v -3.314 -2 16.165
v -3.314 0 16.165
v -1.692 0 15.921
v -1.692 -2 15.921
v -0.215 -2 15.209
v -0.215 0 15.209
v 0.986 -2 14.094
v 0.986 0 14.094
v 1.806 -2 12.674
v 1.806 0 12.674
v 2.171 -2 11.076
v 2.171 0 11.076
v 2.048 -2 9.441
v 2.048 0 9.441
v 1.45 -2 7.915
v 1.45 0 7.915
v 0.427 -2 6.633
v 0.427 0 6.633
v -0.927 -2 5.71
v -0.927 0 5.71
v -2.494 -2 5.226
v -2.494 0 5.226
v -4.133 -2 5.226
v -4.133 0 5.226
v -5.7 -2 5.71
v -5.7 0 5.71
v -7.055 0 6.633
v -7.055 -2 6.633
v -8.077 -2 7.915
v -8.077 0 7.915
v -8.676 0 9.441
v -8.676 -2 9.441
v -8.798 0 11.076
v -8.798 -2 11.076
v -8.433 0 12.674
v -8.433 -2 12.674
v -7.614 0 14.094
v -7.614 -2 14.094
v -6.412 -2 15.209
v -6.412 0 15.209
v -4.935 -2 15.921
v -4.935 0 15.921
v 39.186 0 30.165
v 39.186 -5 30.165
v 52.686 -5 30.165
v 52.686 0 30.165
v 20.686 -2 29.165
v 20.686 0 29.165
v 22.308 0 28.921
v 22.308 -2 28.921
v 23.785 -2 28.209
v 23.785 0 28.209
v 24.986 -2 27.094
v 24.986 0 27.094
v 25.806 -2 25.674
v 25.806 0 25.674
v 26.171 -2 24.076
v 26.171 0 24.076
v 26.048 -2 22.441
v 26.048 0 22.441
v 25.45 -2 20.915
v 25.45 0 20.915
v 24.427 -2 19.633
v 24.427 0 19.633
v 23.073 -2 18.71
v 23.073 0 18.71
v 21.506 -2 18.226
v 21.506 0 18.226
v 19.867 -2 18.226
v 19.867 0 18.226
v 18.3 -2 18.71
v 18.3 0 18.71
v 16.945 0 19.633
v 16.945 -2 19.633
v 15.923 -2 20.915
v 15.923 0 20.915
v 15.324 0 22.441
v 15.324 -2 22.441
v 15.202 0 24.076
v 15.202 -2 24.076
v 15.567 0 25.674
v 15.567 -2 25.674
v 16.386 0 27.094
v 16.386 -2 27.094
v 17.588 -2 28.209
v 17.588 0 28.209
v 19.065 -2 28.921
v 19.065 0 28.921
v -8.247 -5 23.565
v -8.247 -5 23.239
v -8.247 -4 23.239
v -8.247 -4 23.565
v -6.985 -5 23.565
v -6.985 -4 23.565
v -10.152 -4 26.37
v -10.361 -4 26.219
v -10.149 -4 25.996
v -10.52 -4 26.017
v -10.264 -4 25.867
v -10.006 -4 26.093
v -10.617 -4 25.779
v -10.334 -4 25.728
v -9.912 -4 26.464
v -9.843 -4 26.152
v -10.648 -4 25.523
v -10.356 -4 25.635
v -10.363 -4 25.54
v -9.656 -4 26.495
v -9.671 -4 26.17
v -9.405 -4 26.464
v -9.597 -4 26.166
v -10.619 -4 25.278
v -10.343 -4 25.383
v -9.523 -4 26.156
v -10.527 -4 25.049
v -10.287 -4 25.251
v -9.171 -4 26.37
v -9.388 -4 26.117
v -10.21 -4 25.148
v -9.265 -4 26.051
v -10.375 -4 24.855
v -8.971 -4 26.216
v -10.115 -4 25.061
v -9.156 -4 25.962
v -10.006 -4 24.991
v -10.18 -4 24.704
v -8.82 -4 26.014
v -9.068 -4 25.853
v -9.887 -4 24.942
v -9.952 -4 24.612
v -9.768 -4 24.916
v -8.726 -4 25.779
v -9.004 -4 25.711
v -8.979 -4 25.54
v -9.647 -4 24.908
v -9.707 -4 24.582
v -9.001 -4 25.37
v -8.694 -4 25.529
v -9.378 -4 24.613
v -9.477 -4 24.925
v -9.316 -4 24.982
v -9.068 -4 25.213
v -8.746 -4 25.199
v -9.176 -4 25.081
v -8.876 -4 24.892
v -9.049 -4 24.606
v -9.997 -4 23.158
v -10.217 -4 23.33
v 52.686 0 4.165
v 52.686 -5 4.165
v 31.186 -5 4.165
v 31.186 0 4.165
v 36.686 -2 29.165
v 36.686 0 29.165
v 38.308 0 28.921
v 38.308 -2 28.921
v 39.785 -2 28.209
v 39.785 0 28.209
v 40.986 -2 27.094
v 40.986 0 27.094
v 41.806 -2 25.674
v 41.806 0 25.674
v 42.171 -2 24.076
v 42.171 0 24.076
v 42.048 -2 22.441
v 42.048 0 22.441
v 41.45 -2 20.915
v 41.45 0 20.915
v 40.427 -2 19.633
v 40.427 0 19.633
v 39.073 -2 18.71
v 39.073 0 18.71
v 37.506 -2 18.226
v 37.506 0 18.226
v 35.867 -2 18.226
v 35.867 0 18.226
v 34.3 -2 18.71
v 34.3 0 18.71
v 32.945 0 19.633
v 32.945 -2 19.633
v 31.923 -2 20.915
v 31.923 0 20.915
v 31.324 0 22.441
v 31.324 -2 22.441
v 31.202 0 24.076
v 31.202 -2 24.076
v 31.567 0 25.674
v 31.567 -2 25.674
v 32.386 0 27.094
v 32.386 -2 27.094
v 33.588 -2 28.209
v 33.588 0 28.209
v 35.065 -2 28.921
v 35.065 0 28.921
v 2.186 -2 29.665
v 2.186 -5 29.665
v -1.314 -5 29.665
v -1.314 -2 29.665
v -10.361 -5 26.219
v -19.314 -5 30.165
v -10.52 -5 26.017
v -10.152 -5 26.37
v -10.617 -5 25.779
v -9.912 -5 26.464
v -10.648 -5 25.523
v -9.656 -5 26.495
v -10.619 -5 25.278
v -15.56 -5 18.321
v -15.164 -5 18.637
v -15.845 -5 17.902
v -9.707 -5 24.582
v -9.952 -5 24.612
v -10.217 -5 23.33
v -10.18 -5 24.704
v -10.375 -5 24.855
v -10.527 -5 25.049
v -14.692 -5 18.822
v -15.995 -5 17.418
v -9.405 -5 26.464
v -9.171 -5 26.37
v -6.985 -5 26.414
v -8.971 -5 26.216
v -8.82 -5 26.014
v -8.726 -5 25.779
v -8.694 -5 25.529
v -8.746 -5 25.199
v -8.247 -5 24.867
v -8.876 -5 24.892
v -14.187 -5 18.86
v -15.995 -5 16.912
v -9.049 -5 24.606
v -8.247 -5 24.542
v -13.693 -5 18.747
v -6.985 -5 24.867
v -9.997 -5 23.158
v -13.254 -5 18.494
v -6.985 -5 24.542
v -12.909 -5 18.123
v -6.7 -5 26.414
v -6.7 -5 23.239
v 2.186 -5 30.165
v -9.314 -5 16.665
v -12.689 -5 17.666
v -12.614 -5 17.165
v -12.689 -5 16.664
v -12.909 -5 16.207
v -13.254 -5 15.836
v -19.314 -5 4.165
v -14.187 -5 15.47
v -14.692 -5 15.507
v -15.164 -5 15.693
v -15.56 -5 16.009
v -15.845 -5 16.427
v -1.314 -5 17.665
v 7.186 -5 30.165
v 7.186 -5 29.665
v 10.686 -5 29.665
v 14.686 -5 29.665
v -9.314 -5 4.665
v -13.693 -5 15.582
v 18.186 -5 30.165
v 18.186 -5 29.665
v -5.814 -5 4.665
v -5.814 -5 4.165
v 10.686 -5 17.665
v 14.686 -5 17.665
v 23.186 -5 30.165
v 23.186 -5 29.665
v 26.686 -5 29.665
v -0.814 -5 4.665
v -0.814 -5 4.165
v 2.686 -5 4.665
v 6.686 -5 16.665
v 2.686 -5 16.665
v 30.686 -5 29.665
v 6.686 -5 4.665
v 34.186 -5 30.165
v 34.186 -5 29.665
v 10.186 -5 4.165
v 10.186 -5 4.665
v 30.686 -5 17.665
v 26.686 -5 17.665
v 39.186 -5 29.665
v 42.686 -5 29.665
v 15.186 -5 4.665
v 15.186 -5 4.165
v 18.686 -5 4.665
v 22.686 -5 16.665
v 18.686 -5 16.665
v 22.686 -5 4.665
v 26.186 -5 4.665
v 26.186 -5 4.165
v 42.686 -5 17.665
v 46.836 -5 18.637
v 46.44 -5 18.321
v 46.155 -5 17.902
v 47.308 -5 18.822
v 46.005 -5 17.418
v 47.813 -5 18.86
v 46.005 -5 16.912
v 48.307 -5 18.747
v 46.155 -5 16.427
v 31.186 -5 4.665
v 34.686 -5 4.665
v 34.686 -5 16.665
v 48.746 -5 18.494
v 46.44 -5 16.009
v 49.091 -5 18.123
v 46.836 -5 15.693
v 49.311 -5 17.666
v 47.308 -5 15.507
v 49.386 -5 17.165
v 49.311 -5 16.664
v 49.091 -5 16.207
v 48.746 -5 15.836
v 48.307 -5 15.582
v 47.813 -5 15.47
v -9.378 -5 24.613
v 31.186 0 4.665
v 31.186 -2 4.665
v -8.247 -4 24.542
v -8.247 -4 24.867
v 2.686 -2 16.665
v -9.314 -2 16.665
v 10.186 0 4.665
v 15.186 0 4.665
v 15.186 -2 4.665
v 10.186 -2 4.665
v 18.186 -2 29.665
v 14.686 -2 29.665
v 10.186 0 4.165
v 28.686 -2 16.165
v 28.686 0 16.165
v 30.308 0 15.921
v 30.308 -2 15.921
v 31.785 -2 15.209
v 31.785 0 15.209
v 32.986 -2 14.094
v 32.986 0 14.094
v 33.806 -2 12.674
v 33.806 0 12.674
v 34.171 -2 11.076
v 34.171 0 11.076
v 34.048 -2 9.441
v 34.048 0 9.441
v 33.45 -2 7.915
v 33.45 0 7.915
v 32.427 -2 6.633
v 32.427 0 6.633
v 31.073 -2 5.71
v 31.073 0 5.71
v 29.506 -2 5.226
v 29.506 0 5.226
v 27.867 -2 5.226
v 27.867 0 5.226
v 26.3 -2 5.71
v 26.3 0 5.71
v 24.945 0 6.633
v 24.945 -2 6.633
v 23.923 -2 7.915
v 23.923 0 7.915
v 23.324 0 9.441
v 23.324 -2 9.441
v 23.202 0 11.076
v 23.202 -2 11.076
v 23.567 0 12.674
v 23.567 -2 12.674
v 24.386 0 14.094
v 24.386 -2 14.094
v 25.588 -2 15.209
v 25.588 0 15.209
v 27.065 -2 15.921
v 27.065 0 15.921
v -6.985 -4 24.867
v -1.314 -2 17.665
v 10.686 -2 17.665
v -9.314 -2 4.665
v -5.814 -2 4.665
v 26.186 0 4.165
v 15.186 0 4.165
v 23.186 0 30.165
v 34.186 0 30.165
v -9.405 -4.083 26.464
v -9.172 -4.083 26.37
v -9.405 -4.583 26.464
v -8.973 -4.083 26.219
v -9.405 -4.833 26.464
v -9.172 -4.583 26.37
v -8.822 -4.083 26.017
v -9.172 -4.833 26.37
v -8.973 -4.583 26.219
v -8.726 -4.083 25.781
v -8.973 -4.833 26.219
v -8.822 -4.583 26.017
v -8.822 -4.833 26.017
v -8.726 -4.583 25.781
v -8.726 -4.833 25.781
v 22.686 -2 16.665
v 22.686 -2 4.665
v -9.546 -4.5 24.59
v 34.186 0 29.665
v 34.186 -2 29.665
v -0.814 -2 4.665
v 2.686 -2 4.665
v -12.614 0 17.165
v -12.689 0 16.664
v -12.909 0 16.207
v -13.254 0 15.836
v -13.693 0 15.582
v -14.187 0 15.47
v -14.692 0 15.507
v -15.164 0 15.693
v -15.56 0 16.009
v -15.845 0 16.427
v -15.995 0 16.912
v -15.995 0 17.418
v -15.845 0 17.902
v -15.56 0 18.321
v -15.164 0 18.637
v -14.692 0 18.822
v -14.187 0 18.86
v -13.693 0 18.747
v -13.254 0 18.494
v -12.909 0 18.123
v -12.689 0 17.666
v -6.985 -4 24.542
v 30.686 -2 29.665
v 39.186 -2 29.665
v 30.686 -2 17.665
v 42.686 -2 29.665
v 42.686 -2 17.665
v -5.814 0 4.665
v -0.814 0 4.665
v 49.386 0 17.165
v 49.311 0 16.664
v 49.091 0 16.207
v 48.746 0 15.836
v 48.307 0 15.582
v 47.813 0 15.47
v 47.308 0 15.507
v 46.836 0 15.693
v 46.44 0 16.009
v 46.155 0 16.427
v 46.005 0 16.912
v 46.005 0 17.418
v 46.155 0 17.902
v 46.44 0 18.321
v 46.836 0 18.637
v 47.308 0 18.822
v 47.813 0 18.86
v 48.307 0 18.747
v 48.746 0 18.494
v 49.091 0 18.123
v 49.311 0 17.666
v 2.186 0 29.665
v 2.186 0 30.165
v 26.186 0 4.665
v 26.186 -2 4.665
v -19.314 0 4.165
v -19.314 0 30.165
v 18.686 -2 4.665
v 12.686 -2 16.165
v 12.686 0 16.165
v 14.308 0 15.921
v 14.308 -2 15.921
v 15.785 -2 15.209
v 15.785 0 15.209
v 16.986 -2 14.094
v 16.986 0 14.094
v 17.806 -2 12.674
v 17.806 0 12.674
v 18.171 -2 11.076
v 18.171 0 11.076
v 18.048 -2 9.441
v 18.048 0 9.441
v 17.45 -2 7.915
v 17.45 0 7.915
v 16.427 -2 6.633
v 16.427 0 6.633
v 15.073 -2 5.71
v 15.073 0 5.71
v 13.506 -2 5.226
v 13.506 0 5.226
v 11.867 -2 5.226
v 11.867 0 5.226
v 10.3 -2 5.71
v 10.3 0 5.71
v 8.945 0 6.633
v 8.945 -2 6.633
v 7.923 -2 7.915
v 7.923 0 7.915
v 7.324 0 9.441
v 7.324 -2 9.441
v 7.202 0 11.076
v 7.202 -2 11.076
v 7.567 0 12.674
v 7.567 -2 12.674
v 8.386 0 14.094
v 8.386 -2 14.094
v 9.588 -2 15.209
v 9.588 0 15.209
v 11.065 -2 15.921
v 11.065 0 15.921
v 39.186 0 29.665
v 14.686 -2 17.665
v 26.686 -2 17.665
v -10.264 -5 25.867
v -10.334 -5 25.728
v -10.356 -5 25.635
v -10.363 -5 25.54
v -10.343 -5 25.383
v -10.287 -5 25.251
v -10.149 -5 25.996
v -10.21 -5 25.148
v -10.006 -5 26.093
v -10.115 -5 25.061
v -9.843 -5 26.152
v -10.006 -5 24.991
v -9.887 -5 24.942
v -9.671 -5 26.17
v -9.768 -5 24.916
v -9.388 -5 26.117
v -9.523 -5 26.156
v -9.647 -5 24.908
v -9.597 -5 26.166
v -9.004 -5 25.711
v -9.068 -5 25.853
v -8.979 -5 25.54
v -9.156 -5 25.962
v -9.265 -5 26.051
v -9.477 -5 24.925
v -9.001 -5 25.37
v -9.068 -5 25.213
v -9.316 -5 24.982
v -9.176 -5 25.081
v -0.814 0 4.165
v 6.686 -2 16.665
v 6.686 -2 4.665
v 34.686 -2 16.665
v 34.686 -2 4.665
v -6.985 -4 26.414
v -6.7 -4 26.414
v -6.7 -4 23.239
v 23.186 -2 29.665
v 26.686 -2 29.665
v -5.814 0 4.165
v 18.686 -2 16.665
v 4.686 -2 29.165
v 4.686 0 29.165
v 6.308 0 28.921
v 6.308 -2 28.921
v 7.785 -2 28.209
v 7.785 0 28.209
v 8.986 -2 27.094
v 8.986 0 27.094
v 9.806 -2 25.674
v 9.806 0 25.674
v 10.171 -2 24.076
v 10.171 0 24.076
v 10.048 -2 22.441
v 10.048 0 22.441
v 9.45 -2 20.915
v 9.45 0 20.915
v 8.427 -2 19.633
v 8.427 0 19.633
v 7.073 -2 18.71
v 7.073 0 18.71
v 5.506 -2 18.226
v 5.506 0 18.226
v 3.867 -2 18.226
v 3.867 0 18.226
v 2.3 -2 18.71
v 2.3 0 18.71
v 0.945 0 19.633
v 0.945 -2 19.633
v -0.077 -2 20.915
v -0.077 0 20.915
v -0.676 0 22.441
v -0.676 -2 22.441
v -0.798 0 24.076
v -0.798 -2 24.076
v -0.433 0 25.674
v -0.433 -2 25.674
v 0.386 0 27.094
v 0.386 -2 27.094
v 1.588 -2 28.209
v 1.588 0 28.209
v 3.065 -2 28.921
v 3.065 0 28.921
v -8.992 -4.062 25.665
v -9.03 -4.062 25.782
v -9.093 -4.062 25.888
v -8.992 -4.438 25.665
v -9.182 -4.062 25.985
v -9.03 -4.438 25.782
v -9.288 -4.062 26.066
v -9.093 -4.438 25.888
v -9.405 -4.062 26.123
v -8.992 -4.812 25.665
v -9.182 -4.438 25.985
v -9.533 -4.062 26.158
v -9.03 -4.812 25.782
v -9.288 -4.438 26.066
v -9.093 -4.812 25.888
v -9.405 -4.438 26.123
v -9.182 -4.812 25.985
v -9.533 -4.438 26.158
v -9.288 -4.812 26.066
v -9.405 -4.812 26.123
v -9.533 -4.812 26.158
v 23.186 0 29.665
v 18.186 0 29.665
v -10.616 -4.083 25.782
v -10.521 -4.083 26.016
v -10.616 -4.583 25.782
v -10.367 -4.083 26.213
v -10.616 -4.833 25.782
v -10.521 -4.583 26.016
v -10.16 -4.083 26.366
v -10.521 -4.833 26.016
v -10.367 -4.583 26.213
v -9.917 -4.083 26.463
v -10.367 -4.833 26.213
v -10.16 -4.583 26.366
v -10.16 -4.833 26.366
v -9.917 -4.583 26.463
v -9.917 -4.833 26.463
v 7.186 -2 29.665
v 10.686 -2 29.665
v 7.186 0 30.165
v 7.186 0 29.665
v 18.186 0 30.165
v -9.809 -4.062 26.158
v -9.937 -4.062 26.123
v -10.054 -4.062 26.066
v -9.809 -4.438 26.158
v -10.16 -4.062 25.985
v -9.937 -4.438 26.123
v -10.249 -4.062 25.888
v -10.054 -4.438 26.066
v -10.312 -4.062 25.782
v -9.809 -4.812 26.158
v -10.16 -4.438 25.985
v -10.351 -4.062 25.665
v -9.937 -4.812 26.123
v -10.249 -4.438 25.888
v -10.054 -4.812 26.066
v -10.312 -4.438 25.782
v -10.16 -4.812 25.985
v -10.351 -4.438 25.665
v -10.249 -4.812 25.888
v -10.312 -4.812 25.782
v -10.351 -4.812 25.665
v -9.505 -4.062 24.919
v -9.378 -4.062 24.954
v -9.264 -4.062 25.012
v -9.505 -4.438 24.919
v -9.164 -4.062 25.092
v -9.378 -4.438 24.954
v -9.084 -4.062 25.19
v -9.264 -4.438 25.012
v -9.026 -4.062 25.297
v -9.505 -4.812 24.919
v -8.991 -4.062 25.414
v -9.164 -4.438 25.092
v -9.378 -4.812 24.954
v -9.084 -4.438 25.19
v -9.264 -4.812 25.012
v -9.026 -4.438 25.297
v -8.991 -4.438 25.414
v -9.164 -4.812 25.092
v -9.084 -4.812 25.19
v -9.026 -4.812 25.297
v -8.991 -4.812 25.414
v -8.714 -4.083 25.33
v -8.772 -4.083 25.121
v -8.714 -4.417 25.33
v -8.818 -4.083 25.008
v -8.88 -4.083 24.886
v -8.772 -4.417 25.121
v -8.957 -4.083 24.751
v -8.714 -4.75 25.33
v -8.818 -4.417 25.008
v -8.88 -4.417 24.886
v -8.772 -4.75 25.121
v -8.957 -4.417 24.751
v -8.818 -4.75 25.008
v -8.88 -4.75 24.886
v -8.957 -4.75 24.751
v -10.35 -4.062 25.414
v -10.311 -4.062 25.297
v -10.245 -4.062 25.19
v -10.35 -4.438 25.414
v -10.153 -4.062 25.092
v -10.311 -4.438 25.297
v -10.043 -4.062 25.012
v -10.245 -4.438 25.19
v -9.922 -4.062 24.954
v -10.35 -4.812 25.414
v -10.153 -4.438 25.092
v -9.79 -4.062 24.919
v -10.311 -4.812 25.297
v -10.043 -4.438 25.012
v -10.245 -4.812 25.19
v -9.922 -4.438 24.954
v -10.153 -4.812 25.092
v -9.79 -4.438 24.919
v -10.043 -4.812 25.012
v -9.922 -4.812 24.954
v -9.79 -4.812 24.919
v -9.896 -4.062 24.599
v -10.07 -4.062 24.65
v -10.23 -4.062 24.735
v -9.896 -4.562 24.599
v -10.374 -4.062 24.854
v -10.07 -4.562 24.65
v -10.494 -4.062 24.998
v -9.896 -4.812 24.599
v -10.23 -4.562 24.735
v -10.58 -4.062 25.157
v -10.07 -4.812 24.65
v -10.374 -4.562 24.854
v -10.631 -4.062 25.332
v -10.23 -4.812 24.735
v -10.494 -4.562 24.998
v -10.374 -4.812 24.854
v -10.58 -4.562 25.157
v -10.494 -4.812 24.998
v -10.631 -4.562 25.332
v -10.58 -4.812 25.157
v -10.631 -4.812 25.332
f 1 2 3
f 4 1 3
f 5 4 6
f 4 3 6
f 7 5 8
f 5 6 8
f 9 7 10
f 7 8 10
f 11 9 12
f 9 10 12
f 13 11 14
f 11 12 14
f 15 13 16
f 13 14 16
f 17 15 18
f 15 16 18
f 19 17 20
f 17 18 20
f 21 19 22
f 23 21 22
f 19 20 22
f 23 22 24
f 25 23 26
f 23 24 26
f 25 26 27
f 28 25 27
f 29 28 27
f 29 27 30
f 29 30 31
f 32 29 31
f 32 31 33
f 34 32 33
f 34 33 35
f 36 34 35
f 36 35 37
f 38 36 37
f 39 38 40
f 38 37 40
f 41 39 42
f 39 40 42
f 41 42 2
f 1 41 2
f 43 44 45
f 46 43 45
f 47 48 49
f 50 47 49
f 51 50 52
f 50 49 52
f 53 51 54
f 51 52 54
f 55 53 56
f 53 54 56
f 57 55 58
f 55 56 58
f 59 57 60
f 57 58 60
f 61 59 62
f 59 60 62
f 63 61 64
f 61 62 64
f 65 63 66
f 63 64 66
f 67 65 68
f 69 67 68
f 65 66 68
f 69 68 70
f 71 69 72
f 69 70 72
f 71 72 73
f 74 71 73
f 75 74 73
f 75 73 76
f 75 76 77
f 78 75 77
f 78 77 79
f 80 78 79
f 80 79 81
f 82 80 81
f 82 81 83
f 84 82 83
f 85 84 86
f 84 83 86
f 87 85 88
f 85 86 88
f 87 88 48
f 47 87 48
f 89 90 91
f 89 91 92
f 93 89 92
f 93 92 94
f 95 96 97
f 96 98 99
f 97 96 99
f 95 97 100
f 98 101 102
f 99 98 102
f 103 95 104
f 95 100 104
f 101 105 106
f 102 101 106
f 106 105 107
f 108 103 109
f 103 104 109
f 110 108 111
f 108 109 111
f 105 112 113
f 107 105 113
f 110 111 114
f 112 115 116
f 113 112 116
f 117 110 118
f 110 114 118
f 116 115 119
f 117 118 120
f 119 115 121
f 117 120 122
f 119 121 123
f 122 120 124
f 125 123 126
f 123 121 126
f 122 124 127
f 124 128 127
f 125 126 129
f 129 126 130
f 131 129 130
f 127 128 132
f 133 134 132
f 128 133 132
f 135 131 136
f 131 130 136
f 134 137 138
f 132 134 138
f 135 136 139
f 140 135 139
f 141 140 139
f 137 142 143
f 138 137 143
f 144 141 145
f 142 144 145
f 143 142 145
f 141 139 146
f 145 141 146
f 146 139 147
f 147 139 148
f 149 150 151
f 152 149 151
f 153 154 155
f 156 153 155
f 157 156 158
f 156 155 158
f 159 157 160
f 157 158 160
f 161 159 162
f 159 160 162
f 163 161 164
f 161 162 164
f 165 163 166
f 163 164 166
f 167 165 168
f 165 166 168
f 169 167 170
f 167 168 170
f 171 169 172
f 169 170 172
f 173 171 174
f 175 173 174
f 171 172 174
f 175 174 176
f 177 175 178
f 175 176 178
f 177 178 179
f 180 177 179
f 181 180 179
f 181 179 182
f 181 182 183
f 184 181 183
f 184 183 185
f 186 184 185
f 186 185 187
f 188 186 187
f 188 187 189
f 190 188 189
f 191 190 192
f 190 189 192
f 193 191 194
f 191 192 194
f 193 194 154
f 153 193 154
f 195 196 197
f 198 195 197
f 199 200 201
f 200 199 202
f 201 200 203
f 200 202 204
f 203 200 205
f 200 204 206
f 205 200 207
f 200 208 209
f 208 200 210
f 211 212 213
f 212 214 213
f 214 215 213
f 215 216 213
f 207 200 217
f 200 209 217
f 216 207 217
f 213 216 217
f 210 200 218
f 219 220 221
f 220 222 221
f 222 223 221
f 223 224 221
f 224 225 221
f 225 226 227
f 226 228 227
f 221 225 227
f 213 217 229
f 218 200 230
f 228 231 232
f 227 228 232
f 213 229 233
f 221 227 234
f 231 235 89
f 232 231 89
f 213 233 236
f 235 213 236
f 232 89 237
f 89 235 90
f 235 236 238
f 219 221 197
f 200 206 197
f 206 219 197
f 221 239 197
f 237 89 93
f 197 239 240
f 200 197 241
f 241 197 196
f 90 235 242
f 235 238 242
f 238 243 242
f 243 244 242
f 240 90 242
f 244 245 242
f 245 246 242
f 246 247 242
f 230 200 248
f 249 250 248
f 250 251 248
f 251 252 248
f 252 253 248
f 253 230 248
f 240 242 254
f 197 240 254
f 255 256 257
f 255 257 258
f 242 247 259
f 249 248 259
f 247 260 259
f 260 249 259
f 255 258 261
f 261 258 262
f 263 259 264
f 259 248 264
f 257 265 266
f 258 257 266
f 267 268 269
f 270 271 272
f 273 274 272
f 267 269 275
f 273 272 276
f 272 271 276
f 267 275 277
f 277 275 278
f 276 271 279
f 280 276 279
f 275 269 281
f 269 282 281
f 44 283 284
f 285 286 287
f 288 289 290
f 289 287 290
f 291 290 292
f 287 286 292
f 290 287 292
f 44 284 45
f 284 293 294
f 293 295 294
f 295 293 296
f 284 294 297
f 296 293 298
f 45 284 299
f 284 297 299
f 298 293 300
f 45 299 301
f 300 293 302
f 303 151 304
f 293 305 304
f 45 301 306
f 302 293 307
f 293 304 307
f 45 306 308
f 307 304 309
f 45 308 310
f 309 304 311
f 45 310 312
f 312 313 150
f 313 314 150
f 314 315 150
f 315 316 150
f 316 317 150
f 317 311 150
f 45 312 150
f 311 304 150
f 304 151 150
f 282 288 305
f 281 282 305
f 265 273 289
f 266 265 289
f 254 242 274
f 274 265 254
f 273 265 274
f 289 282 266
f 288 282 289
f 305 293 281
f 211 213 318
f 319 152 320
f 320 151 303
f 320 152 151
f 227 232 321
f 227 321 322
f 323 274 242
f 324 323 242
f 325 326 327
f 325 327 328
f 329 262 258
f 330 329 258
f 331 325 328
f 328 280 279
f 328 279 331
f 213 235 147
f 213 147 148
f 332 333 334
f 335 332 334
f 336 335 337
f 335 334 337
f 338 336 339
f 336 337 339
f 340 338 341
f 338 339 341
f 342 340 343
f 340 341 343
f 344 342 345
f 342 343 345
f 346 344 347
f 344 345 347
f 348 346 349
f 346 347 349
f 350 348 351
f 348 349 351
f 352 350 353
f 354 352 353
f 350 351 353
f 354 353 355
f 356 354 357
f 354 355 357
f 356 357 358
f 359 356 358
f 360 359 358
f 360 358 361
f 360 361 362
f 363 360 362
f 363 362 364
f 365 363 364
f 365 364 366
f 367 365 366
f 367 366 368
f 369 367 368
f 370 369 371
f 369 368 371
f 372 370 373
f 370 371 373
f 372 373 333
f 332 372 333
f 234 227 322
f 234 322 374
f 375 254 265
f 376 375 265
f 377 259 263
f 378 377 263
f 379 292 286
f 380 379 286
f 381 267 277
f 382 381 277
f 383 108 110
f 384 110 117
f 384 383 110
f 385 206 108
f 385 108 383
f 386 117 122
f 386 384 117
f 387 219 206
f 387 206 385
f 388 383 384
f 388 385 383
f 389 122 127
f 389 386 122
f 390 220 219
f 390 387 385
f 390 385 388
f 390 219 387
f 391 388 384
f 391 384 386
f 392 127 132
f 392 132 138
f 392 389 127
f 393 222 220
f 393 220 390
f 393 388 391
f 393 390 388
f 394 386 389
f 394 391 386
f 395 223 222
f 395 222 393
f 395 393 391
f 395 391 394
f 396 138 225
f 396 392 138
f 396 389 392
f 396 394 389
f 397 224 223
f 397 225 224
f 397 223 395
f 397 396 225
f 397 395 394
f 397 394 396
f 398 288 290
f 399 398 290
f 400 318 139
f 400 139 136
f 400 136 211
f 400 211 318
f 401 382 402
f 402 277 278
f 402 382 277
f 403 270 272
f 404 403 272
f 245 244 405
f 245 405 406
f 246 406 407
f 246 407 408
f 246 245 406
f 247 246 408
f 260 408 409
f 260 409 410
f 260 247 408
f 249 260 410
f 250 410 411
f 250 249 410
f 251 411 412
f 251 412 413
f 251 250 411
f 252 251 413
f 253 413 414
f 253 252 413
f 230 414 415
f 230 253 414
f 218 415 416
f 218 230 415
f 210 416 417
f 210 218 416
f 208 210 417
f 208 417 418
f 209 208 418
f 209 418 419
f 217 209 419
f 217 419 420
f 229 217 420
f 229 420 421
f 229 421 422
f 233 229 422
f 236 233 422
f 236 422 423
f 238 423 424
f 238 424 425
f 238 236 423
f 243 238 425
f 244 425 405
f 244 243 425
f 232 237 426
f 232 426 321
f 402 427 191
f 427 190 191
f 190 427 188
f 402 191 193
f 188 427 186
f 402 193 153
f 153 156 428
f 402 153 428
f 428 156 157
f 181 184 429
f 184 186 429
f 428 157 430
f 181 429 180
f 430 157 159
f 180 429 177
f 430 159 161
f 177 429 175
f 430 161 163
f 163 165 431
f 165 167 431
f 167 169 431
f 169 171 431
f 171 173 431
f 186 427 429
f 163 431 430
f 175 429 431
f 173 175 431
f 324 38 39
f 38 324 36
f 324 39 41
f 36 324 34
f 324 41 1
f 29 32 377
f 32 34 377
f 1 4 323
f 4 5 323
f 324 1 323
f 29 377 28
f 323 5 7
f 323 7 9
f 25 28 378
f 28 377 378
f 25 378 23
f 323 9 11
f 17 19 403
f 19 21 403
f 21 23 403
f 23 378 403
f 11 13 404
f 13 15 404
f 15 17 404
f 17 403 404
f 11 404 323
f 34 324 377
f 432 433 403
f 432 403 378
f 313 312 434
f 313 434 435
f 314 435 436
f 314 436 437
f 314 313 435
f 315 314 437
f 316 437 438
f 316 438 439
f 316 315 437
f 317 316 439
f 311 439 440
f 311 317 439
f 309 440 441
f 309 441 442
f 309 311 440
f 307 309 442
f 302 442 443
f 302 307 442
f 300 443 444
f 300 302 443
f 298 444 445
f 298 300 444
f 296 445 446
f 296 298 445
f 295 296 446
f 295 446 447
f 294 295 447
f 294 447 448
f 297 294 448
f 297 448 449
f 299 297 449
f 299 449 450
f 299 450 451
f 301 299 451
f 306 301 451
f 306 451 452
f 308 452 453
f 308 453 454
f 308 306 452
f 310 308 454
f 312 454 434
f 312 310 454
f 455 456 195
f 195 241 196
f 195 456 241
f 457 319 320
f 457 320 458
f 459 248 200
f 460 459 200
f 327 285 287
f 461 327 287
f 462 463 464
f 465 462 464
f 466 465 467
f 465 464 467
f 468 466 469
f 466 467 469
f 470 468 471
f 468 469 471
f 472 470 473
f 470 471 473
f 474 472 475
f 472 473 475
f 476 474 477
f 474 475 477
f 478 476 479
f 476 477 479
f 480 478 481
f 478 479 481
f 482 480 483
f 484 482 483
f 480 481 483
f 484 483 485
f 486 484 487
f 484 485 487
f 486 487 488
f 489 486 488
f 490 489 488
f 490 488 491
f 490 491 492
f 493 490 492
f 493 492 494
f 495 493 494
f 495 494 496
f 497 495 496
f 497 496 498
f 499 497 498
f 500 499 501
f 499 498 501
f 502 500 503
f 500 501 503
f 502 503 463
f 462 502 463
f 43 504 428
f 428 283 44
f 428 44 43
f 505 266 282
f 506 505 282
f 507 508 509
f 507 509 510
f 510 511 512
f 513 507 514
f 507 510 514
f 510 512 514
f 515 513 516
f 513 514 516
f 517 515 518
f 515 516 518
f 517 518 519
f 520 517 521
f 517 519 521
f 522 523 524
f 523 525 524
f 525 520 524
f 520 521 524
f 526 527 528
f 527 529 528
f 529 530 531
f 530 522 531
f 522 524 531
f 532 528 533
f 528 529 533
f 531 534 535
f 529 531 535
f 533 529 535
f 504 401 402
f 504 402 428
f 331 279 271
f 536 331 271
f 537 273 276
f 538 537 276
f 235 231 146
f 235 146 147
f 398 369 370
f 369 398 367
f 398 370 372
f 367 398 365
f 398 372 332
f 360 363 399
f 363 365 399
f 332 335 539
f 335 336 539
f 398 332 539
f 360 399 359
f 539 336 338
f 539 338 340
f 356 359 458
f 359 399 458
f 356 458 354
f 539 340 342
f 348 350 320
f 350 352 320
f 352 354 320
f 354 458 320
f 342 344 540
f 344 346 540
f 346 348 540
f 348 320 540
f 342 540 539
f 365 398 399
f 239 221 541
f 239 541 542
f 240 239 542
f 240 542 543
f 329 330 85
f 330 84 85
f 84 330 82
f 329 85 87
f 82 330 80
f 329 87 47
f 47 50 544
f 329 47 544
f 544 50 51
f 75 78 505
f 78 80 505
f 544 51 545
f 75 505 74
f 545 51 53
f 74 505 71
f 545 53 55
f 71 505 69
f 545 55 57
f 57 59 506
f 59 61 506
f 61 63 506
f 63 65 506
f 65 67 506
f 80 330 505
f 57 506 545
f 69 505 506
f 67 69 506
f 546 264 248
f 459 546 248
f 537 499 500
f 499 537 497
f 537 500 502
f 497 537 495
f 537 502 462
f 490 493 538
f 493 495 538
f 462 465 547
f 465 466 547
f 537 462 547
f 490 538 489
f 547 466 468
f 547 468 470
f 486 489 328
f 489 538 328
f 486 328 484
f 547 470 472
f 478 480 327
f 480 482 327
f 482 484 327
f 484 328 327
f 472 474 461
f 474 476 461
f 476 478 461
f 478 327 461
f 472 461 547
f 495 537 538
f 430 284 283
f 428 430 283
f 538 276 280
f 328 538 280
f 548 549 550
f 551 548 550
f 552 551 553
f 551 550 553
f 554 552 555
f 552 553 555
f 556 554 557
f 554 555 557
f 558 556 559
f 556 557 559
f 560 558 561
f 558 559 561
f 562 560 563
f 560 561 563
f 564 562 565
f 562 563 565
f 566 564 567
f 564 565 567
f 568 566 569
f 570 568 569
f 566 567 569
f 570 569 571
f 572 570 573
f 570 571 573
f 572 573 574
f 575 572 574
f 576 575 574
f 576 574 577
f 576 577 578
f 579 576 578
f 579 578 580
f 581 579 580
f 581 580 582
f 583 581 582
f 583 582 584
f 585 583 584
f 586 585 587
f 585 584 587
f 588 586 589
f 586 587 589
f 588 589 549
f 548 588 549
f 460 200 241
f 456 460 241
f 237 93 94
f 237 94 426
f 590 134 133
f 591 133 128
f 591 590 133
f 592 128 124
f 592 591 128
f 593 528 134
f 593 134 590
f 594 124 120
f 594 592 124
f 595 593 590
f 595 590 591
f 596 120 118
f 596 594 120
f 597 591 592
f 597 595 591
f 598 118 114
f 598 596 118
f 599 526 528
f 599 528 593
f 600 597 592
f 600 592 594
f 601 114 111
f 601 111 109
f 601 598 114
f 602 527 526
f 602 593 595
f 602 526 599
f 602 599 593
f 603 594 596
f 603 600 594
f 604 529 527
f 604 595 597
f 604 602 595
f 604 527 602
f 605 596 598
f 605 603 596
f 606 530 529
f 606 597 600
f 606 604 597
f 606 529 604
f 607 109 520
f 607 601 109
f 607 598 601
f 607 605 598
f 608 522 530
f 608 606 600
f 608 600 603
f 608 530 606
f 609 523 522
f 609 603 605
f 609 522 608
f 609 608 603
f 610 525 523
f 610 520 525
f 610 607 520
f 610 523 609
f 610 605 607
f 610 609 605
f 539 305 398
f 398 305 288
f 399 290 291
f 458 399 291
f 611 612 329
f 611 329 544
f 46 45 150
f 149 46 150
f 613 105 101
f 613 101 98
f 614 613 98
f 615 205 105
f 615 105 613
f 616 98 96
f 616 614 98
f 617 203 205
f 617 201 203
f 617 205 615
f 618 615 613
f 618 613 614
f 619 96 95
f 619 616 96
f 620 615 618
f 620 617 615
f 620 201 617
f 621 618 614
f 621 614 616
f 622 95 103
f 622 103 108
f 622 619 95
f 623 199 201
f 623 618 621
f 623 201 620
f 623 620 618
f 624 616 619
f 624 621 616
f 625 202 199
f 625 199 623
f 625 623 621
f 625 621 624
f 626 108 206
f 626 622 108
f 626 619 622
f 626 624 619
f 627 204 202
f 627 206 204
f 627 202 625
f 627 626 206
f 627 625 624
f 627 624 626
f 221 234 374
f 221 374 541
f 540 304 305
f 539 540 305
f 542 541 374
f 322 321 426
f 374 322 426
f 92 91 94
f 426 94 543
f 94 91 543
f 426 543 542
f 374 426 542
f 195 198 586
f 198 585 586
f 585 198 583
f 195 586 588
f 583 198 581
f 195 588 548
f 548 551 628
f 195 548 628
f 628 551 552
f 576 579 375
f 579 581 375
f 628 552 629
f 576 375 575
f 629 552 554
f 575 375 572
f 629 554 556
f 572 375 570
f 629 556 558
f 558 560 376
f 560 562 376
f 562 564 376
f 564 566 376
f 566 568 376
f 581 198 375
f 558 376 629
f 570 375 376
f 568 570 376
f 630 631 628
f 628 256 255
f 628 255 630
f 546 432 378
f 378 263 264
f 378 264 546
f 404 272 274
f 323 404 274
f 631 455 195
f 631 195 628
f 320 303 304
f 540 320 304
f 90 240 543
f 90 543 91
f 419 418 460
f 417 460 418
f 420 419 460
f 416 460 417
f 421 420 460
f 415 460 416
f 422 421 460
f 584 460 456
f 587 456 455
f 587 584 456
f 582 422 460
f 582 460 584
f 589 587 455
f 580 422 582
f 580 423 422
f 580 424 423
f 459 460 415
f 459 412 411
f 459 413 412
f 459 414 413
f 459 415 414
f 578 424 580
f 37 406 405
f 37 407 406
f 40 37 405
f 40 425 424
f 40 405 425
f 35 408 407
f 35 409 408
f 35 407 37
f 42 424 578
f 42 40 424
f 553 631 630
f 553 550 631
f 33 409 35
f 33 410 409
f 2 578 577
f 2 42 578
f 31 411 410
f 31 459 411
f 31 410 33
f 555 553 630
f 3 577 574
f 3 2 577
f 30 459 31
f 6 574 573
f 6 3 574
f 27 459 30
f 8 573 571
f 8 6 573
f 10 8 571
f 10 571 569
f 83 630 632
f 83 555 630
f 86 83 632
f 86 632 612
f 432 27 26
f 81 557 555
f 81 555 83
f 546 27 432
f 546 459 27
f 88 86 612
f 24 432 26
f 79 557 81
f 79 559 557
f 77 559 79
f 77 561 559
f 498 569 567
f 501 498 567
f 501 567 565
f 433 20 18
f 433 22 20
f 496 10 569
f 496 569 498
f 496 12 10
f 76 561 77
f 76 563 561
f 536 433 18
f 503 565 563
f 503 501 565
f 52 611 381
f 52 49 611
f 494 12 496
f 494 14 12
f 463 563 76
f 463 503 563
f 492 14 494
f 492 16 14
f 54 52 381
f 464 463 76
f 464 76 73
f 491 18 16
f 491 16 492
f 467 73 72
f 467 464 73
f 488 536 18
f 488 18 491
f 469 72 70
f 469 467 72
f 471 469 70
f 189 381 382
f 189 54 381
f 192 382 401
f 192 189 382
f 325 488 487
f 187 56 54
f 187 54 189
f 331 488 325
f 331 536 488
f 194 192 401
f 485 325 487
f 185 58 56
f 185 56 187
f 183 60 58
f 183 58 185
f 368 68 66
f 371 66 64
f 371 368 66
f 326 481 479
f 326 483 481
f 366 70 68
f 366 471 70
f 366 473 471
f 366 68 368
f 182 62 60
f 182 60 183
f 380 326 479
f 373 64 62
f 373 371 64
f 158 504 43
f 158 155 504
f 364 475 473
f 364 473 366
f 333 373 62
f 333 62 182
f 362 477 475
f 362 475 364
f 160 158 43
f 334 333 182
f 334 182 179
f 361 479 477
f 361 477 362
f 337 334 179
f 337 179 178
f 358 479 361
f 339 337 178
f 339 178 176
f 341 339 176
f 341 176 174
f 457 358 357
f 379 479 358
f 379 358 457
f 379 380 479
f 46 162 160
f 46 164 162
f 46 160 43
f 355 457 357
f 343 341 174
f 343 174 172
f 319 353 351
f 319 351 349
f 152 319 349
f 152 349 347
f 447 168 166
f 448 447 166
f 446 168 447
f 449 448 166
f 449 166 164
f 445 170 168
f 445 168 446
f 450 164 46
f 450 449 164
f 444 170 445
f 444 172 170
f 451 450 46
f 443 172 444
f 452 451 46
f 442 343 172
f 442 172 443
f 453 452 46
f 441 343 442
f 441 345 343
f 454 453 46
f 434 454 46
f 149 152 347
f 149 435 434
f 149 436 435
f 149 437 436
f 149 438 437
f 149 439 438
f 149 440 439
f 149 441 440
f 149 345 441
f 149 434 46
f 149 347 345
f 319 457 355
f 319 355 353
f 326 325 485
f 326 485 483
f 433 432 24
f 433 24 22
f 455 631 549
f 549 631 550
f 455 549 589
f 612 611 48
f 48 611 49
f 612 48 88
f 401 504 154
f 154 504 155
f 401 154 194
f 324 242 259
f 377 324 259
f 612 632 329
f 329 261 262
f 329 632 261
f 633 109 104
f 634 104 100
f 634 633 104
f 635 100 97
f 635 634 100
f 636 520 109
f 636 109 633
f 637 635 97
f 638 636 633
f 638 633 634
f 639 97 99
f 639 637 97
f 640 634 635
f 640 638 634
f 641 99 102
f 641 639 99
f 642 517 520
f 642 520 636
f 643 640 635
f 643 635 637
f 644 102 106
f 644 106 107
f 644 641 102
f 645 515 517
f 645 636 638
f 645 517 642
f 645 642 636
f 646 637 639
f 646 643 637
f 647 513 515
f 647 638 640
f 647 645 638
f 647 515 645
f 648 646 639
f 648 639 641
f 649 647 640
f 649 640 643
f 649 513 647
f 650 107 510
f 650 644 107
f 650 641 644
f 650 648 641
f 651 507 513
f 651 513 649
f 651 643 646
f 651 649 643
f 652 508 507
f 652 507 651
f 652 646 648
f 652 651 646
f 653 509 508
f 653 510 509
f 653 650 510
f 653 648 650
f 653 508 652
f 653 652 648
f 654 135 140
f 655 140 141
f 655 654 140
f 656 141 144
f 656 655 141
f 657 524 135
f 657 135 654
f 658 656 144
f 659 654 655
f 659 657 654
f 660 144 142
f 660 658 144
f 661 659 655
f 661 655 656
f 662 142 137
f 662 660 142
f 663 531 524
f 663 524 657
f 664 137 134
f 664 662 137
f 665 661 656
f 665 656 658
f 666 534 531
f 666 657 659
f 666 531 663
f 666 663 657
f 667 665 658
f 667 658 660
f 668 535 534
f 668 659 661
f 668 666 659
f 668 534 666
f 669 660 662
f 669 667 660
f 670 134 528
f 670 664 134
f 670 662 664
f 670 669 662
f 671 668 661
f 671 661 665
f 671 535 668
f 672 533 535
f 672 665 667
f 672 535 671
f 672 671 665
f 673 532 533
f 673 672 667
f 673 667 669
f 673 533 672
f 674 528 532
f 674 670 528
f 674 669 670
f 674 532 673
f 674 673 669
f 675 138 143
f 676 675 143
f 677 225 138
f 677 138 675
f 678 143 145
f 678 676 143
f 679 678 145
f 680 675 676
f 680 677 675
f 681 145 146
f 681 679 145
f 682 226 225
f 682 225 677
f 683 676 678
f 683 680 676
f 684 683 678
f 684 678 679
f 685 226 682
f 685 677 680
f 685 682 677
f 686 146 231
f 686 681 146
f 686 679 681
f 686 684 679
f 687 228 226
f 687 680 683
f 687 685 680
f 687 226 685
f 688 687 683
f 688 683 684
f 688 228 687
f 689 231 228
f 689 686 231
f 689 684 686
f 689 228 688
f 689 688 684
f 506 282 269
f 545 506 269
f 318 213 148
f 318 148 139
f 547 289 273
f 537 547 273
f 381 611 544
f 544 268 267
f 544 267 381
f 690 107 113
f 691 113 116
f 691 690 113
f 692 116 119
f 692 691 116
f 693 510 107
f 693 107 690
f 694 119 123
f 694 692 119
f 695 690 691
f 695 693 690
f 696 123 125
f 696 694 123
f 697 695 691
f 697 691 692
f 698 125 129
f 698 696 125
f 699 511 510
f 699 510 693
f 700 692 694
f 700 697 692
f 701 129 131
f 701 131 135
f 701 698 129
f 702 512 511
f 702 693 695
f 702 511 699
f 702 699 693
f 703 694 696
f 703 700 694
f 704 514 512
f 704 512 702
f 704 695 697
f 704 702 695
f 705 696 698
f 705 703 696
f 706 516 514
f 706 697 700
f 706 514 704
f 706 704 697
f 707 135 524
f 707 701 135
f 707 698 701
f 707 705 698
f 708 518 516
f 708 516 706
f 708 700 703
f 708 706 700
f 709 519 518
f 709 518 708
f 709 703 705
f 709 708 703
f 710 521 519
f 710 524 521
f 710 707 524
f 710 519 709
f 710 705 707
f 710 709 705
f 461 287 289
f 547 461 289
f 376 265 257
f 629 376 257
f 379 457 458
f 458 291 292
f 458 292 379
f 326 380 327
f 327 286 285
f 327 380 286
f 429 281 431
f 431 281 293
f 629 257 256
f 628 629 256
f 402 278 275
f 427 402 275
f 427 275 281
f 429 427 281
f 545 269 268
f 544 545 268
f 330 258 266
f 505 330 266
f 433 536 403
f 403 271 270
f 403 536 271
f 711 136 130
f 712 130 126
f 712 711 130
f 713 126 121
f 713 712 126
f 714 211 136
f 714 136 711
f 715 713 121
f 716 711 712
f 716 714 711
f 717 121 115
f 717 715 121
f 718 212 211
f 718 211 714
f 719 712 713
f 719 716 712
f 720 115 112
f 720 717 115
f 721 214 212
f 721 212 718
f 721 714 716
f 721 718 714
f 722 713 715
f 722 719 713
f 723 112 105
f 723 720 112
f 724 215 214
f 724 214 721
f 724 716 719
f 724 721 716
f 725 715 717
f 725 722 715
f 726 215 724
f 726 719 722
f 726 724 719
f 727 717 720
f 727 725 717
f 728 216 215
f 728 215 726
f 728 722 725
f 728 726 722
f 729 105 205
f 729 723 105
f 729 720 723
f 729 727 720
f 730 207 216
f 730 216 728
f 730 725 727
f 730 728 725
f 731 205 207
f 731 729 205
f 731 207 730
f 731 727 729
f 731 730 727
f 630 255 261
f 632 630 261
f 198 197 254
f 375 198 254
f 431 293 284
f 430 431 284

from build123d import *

# Parameters (mm, degrees)
SKETCH1_R             = 5.5
BOSS_EXTRUDE1_DEPTH   = 2
BOSS_EXTRUDE1_2_DEPTH = 2
BOSS_EXTRUDE1_3_DEPTH = 2
BOSS_EXTRUDE1_4_DEPTH = 2
BOSS_EXTRUDE1_5_DEPTH = 2
BOSS_EXTRUDE1_6_DEPTH = 2
SKETCH1_3_R           = 1.7
BOSS_EXTRUDE2_DEPTH   = 5
CUT_EXTRUDE1_DEPTH    = 1


with BuildPart() as part:
    # Sketch1 → Boss-Extrude1 (new body)
    with BuildSketch(Plane(origin=(0, 0, 0), x_dir=(1, 0, 0), z_dir=(0, 1, 0))):
        Polygon((2.68639507, -4.66487452), (-9.31360493, -4.664874562), (-9.313604887, -16.664874562), (2.686395113, -16.66487452), align=None)
        with Locations((-3.313604908, -10.664874541)):
            Circle(SKETCH1_R, mode=Mode.SUBTRACT)
    extrude(amount=-BOSS_EXTRUDE1_DEPTH)



with BuildPart() as body_2:
    # Sketch1 → Boss-Extrude1 2 (new body)
    with BuildSketch(Plane(origin=(0, 0, 0), x_dir=(1, 0, 0), z_dir=(0, 1, 0))):
        Polygon((18.68639507, -4.664873819), (6.68639507, -4.664873862), (6.686395113, -16.664873862), (18.686395113, -16.664873819), align=None)
        with Locations((12.686395092, -10.66487384)):
            Circle(SKETCH1_R, mode=Mode.SUBTRACT)
    extrude(amount=-BOSS_EXTRUDE1_2_DEPTH)


with BuildPart() as body_3:
    # Sketch1 → Boss-Extrude1 3 (new body)
    with BuildSketch(Plane(origin=(0, 0, 0), x_dir=(1, 0, 0), z_dir=(0, 1, 0))):
        Polygon((-1.313604837, -29.664873456), (10.686395163, -29.664873413), (10.68639512, -17.664873413), (-1.31360488, -17.664873456), align=None)
        with Locations((4.686395141, -23.664873434)):
            Circle(SKETCH1_R, mode=Mode.SUBTRACT)
    extrude(amount=-BOSS_EXTRUDE1_3_DEPTH)


with BuildPart() as body_4:
    # Sketch1 → Boss-Extrude1 4 (new body)
    with BuildSketch(Plane(origin=(0, 0, 0), x_dir=(1, 0, 0), z_dir=(0, 1, 0))):
        Polygon((14.686395163, -29.664873833), (26.686395163, -29.664873791), (26.68639512, -17.664873791), (14.68639512, -17.664873833), align=None)
        with Locations((20.686395141, -23.664873812)):
            Circle(SKETCH1_R, mode=Mode.SUBTRACT)
    extrude(amount=-BOSS_EXTRUDE1_4_DEPTH)


with BuildPart() as body_5:
    # Sketch1 → Boss-Extrude1 5 (new body)
    with BuildSketch(Plane(origin=(0, 0, 0), x_dir=(1, 0, 0), z_dir=(0, 1, 0))):
        Polygon((34.68639507, -4.664873762), (22.68639507, -4.664873805), (22.686395113, -16.664873805), (34.686395113, -16.664873762), align=None)
        with Locations((28.686395092, -10.664873784)):
            Circle(SKETCH1_R, mode=Mode.SUBTRACT)
    extrude(amount=-BOSS_EXTRUDE1_5_DEPTH)


with BuildPart() as body_6:
    # Sketch1 → Boss-Extrude1 6 (new body)
    with BuildSketch(Plane(origin=(0, 0, 0), x_dir=(1, 0, 0), z_dir=(0, 1, 0))):
        Polygon((30.686395163, -29.664873979), (42.686395163, -29.664873936), (42.68639512, -17.664873936), (30.68639512, -17.664873979), align=None)
        with Locations((36.686395141, -23.664873958)):
            Circle(SKETCH1_R, mode=Mode.SUBTRACT)
    extrude(amount=-BOSS_EXTRUDE1_6_DEPTH)


with BuildPart() as part_1:
    add(part.part)

    add(body_2.part)  # Boss-Extrude2 merges body 2

    add(body_3.part)  # Boss-Extrude2 merges body 3

    add(body_4.part)  # Boss-Extrude2 merges body 4

    add(body_5.part)  # Boss-Extrude2 merges body 5

    add(body_6.part)  # Boss-Extrude2 merges body 6
    # Sketch1<3> → Boss-Extrude2 (add)
    with BuildSketch(Plane(origin=(0, 0, 0), x_dir=(1, 0, 0), z_dir=(0, 1, 0))):
        Polygon((6.186395002, -4.164873846), (3.186395002, -4.1648745), (-0.813604931, -4.164874532), (-0.81360493, -4.664874532), (2.68639507, -4.66487452), (2.686395113, -16.66487452), (-9.313604887, -16.664874562), (-9.31360493, -4.664874562), (-5.81360493, -4.66487455), (-5.813604931, -4.16487455), (-9.813604931, -4.164874564), (-19.313604998, -4.164874546), (-19.313604998, -30.16487344), (-1.813604902, -30.16487344), (2.186395164, -30.164873443), (2.186395163, -29.664873443), (-1.313604837, -29.664873456), (-1.31360488, -17.664873456), (10.68639512, -17.664873413), (10.686395163, -29.664873413), (7.186395163, -29.664873425), (7.186395164, -30.164873425), (11.186395164, -30.164873411), (14.186395098, -30.164873817), (18.186395164, -30.164873821), (18.186395163, -29.664873821), (14.686395163, -29.664873833), (14.68639512, -17.664873833), (26.68639512, -17.664873791), (26.686395163, -29.664873791), (23.186395163, -29.664873803), (23.186395164, -30.164873803), (27.186395164, -30.164873789), (30.186395098, -30.164873963), (34.186395164, -30.164873966), (34.186395163, -29.664873966), (30.686395163, -29.664873979), (30.68639512, -17.664873979), (42.68639512, -17.664873936), (42.686395163, -29.664873936), (39.186395163, -29.664873949), (39.186395164, -30.164873949), (43.186395164, -30.164873935), (52.686395098, -30.16487344), (52.686395098, -4.164874546), (35.186395002, -4.164873743), (31.186395069, -4.164873775), (31.18639507, -4.664873775), (34.68639507, -4.664873762), (34.686395113, -16.664873762), (22.686395113, -16.664873805), (22.68639507, -4.664873805), (26.18639507, -4.664873793), (26.186395069, -4.164873793), (22.186395069, -4.164873807), (19.186395002, -4.1648738), (15.186395069, -4.164873832), (15.18639507, -4.664873832), (18.68639507, -4.664873819), (18.686395113, -16.664873819), (6.686395113, -16.664873862), (6.68639507, -4.664873862), (10.18639507, -4.664873849), (10.186395069, -4.164873849), align=None)
        with Locations((-14.313604998, -17.164873993)):
            Circle(SKETCH1_3_R, mode=Mode.SUBTRACT)
        with Locations((47.686395098, -17.164873993)):
            Circle(SKETCH1_3_R, mode=Mode.SUBTRACT)
    extrude(amount=-BOSS_EXTRUDE2_DEPTH)

    # Sketch2 → Cut-Extrude1 (cut)
    # profile 1 of 2: a face of its own
    with BuildSketch(Plane(origin=(0, -5, 0), x_dir=(-1, 0, 0), z_dir=(0, -1, 0))):
        Polygon((6.699801581, -23.2390136), (8.246596453, -23.2390136), (8.246596453, -23.564654626), (6.984737478, -23.564654626), (6.984737478, -24.541577703), (8.246596453, -24.541577703), (8.246596453, -24.867218728), (6.984737478, -24.867218728), (6.984737478, -26.4140136), (6.699801581, -26.4140136), align=None)
    # profile 2 of 2: a face of its own
    with BuildSketch(Plane(origin=(0, -5, 0), x_dir=(-1, 0, 0), z_dir=(0, -1, 0))):
        with BuildLine():
            Line((9.996916965, -23.157603344), (10.216979065, -23.329964121))
            Line((10.216979065, -23.329964121), (9.378071813, -24.612811677))
            add(Edge.make_bspline(
                [(9.378071813, -24.612811677), (9.43392485, -24.603909103), (9.542872514, -24.586543627), (9.65315015, -24.583678919), (9.706892927, -24.582282831)],
                knots=[0, 0, 0, 0, 1.025318673, 2, 2, 2, 2], degree=3))
            add(Edge.make_bspline(
                [(9.706892927, -24.582282831), (9.739163887, -24.583137599), (9.802478203, -24.584814619), (9.895509725, -24.598067595), (9.984924431, -24.618695779), (10.070522851, -24.64888638), (10.152413619, -24.68743998), (10.231065003, -24.733649384), (10.30499899, -24.789897237), (10.375167554, -24.852730491), (10.438873565, -24.922323744), (10.49527613, -24.996166388), (10.542653291, -25.074181472), (10.581092491, -25.156329486), (10.610941917, -25.2424838), (10.632702138, -25.332534184), (10.645565054, -25.426542733), (10.647311749, -25.490476506), (10.648199017, -25.522952903)],
                knots=[0, 0, 0, 0, 1.044136307, 2.048553127, 3.035567123, 4.010001674, 4.980053131, 5.96154148, 6.956538004, 7.981742224, 9.006487041, 10.005615874, 10.984750588, 11.954802044, 12.935714515, 13.930994945, 14.949008866, 16, 16, 16, 16], degree=3))
            add(Edge.make_bspline(
                [(10.648199017, -25.522952903), (10.646908057, -25.567384491), (10.644367755, -25.654815343), (10.619055025, -25.782157069), (10.579721633, -25.903471565), (10.523499161, -26.016821942), (10.453665142, -26.122052845), (10.368504755, -26.215293946), (10.271038162, -26.298451765), (10.160832281, -26.36799027), (10.042229735, -26.42478018), (9.917631851, -26.465570078), (9.788248654, -26.49068294), (9.700433045, -26.493831272), (9.656011517, -26.495423856)],
                knots=[0, 0, 0, 0, 1.031375318, 2.029502543, 3.004789286, 3.987476834, 4.960371455, 5.9300674, 6.912260825, 7.929083631, 8.949397511, 9.960523116, 10.96833055, 12, 12, 12, 12], degree=3))
            add(Edge.make_bspline(
                [(9.656011517, -26.495423856), (9.613288081, -26.494037555), (9.528660436, -26.491291536), (9.404170686, -26.466829578), (9.284552092, -26.427180992), (9.170642725, -26.372558039), (9.065123312, -26.303562674), (8.970720913, -26.220502607), (8.887906232, -26.125153306), (8.818986397, -26.017529563), (8.764323119, -25.901877958), (8.723329401, -25.781284966), (8.699384238, -25.656189983), (8.69603819, -25.571389235), (8.694352863, -25.528677062)],
                knots=[0, 0, 0, 0, 1.012016664, 2.004627821, 2.994792927, 3.992885782, 4.990978636, 5.973936114, 6.964471063, 7.975201453, 8.993600317, 9.990122807, 10.98767138, 12, 12, 12, 12], degree=3))
            add(Edge.make_bspline(
                [(8.694352863, -25.528677062), (8.695424602, -25.495979475), (8.697612889, -25.429217252), (8.712892251, -25.328103455), (8.737443886, -25.224642831), (8.764939609, -25.136872955), (8.793991413, -25.064971432), (8.818169074, -25.007001837), (8.848262627, -24.947347149), (8.880351337, -24.883961779), (8.91732364, -24.818479279), (8.957524265, -24.749805236), (9.002064662, -24.679031831), (9.033288667, -24.631003882), (9.049250699, -24.606451501)],
                knots=[0, 0, 0, 0, 1.173818275, 2.396712641, 3.66331629, 4.989737886, 5.693666774, 6.447286557, 7.243889047, 8.091586357, 8.998013824, 9.943181721, 10.948533338, 12, 12, 12, 12], degree=3))
            Line((9.049250699, -24.606451501), (9.996916965, -23.157603344))
        make_face()
        with BuildLine():
            add(Edge.make_bspline(
                [(9.64710727, -24.907923856), (9.622921579, -24.908639019), (9.575469451, -24.910042162), (9.505937895, -24.917966716), (9.440309411, -24.932982832), (9.377830069, -24.952402516), (9.31916676, -24.978858553), (9.263592246, -25.010560401), (9.211746157, -25.048541998), (9.16388158, -25.091418934), (9.120507249, -25.138406483), (9.083148796, -25.188723076), (9.050925237, -25.241169384), (9.024725214, -25.296180139), (9.004323526, -25.353735218), (8.989565892, -25.413569669), (8.981352848, -25.476084793), (8.97998648, -25.518477849), (8.97928876, -25.540125379)],
                knots=[0, 0, 0, 0, 1.128956033, 2.215002439, 3.259141796, 4.2666399, 5.263148119, 6.255916712, 7.247353359, 8.256307737, 9.250603402, 10.226115518, 11.176314381, 12.118911324, 13.063945463, 14.021379252, 14.989639887, 16, 16, 16, 16], degree=3))
            add(Edge.make_bspline(
                [(8.97928876, -25.540125379), (8.97985696, -25.561579289), (8.980971114, -25.603647213), (8.991087861, -25.665640612), (9.006541115, -25.725298779), (9.029528474, -25.782314158), (9.056948579, -25.837555818), (9.093148409, -25.889022827), (9.133259351, -25.939841033), (9.181205419, -25.986106654), (9.232661612, -26.029156591), (9.28763556, -26.066785107), (9.344930667, -26.098976136), (9.405320457, -26.124204774), (9.467948134, -26.144909663), (9.533335493, -26.159479719), (9.601528012, -26.167717054), (9.647721485, -26.169085201), (9.67127594, -26.169782831)],
                knots=[0, 0, 0, 0, 0.989467248, 1.94019797, 2.891935182, 3.827694429, 4.772920941, 5.730924762, 6.725747692, 7.756678648, 8.79901574, 9.819492441, 10.826891316, 11.826466727, 12.835195252, 13.867842842, 14.912794438, 16, 16, 16, 16], degree=3))
            add(Edge.make_bspline(
                [(9.67127594, -26.169782831), (9.694830356, -26.169085146), (9.741023753, -26.167716892), (9.809216821, -26.159480335), (9.874602152, -26.144907404), (9.9372372, -26.124212963), (9.997599783, -26.09894576), (10.054844781, -26.066985375), (10.109298837, -26.028925183), (10.16078881, -25.986180223), (10.208535311, -25.939577707), (10.249608271, -25.889476459), (10.28469949, -25.837139854), (10.313214788, -25.782531768), (10.335948959, -25.725264304), (10.351480576, -25.665649848), (10.361576431, -25.603644795), (10.362693456, -25.561578473), (10.363263119, -25.540125379)],
                knots=[0, 0, 0, 0, 1.087397944, 2.132534446, 3.165364764, 4.174271784, 5.174024072, 6.181601208, 7.194203697, 8.236725232, 9.267838612, 10.269026844, 11.221737037, 12.171628256, 13.107553087, 14.05945871, 15.010357665, 16, 16, 16, 16], degree=3))
            add(Edge.make_bspline(
                [(10.363263119, -25.540125379), (10.362763924, -25.518449609), (10.361784167, -25.475907121), (10.350702565, -25.413597625), (10.335333378, -25.35343124), (10.31212604, -25.29578579), (10.28197527, -25.240889945), (10.245252874, -25.18846183), (10.202761835, -25.138117296), (10.153715725, -25.091298499), (10.100325283, -25.048806355), (10.043918117, -25.010417813), (9.98414317, -24.979153645), (9.922078942, -24.95231253), (9.856977887, -24.933290658), (9.789551091, -24.917919833), (9.719159645, -24.910108409), (9.671290808, -24.908657076), (9.64710727, -24.907923856)],
                knots=[0, 0, 0, 0, 0.978753431, 1.920974676, 2.853199117, 3.782215702, 4.721507756, 5.67862441, 6.671401678, 7.694929396, 8.738190014, 9.75360867, 10.774035531, 11.783329636, 12.805060902, 13.835252836, 14.906360638, 16, 16, 16, 16], degree=3))
        make_face(mode=Mode.SUBTRACT)
    extrude(amount=-CUT_EXTRUDE1_DEPTH, mode=Mode.SUBTRACT)


solid = part_1.part
